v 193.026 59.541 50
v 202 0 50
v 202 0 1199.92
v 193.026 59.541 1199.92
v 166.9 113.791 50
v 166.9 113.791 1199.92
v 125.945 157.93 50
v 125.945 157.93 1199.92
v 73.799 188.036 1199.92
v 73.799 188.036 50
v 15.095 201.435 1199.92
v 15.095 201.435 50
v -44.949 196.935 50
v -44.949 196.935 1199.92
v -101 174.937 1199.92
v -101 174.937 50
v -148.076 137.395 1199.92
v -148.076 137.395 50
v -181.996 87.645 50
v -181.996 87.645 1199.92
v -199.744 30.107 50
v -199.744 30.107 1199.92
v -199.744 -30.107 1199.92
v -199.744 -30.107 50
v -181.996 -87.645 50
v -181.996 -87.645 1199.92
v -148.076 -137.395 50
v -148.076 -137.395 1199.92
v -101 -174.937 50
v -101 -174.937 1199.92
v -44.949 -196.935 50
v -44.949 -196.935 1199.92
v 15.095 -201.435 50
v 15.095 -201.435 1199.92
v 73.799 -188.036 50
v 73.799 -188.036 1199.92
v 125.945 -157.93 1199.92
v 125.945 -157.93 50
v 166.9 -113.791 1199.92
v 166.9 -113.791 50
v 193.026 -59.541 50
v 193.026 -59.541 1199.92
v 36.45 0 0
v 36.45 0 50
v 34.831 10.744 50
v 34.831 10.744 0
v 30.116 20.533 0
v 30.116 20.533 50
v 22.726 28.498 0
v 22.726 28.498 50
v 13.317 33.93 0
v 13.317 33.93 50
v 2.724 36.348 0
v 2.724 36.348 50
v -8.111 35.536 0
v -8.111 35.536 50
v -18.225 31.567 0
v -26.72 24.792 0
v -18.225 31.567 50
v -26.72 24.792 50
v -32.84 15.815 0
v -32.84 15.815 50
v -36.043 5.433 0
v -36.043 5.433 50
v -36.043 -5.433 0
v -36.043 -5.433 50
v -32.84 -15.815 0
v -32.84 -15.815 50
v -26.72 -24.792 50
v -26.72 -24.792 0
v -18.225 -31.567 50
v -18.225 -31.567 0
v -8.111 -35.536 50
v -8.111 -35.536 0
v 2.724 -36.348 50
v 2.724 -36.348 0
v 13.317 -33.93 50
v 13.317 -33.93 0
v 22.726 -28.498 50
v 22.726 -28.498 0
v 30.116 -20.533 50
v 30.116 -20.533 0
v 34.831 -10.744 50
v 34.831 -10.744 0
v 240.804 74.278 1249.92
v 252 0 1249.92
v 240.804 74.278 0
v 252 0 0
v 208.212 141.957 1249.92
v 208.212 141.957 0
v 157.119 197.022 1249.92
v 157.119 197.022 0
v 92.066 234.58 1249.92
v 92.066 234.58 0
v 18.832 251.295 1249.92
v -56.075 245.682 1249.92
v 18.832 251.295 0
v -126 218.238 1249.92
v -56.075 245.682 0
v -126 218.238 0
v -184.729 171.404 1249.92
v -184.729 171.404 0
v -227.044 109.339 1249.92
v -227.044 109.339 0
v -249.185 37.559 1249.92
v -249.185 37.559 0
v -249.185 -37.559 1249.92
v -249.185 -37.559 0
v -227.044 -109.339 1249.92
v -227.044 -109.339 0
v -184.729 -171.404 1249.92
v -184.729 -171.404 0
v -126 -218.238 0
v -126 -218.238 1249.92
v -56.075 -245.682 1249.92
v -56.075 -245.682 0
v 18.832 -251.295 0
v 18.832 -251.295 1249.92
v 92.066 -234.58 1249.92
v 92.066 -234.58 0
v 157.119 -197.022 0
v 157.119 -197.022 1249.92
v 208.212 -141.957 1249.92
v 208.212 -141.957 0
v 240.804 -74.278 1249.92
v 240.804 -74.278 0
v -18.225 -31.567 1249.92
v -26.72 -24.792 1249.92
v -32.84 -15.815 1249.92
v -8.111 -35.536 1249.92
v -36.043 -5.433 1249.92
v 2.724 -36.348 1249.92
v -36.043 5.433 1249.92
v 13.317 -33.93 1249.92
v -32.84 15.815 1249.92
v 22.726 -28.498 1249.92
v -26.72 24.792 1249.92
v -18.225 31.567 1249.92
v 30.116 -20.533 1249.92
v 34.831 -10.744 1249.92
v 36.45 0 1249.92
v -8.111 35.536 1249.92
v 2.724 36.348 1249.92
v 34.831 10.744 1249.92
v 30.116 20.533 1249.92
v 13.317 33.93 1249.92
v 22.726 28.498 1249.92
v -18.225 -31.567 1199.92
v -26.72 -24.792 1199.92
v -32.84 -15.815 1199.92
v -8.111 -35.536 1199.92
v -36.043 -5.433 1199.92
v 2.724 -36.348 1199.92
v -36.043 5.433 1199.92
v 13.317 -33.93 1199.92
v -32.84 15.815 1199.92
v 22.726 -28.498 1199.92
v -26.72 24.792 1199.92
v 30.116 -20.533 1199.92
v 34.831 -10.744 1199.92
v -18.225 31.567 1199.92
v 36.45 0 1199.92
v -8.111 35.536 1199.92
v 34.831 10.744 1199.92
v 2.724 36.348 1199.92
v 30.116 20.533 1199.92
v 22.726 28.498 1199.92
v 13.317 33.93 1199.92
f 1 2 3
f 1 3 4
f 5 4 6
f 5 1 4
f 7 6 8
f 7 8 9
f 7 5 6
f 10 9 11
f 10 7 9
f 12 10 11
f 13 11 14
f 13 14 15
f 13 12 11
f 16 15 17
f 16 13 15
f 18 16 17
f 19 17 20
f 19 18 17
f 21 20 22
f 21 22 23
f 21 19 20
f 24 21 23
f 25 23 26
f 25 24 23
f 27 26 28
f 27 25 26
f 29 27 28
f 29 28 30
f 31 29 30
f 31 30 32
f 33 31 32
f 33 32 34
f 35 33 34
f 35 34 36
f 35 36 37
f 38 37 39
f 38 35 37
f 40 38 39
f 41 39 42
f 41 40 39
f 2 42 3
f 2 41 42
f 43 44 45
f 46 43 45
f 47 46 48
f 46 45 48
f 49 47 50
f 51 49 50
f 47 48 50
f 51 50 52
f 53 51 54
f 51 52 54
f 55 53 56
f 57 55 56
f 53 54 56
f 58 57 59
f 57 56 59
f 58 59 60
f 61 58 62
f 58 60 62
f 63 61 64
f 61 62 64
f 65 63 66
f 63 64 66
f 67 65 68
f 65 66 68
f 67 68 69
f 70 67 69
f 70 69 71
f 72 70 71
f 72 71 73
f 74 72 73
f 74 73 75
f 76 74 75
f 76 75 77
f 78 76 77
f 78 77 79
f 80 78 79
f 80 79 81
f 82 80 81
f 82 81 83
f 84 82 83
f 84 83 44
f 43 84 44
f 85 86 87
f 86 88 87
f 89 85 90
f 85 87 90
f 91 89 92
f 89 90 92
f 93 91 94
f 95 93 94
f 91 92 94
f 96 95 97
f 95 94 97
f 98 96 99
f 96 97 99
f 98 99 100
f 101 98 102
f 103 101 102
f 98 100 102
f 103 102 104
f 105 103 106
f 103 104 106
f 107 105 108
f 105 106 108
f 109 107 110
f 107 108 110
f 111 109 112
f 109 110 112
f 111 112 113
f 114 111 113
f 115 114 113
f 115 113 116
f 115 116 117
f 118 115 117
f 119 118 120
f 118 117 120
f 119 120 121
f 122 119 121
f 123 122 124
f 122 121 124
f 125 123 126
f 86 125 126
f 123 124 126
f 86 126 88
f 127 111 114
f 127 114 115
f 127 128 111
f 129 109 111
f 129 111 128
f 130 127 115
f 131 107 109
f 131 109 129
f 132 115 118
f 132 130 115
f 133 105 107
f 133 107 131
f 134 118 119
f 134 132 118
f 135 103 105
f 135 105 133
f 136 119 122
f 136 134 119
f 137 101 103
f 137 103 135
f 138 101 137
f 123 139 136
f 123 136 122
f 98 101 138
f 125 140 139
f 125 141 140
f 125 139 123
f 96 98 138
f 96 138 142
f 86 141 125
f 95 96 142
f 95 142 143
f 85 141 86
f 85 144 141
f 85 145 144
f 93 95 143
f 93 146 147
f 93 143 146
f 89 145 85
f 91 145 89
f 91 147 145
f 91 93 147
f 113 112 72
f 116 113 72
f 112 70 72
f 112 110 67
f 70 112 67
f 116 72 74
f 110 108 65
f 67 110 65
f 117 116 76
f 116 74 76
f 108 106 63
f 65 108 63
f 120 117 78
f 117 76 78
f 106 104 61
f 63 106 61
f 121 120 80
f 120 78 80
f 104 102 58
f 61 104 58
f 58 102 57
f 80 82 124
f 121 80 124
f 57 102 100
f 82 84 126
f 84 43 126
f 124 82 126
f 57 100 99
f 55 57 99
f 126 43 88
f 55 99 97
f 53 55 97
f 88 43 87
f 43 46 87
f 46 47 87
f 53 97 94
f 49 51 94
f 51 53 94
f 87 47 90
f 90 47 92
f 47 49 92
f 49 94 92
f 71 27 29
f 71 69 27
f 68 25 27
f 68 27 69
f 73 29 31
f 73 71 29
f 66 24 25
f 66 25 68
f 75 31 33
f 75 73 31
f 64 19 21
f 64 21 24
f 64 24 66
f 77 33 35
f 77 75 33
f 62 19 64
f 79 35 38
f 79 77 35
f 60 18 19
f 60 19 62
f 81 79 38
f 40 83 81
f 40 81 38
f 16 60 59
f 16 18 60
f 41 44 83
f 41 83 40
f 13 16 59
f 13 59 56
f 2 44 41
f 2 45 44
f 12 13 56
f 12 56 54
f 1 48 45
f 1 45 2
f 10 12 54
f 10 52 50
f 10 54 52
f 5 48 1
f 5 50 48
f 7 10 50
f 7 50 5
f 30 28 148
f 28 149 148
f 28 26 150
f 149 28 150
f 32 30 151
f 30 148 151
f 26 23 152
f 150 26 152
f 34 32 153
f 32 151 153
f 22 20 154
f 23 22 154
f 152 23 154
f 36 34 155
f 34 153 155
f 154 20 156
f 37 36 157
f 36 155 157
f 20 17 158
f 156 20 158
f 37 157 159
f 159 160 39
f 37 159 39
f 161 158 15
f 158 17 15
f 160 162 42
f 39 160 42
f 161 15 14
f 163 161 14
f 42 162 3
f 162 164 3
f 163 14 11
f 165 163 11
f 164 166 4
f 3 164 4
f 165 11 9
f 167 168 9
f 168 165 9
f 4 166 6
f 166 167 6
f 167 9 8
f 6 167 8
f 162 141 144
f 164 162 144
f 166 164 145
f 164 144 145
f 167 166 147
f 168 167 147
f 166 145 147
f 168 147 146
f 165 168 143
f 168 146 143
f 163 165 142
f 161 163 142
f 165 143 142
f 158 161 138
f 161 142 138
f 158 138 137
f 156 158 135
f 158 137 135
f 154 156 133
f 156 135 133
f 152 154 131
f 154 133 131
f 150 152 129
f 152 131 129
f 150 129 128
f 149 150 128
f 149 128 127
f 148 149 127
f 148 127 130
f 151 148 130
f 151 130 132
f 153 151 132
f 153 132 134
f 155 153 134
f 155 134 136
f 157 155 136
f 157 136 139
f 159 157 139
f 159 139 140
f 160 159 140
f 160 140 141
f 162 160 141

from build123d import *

# Parameters (mm, degrees)
SKETCH1_R           = 252
BOSS_EXTRUDE1_DEPTH = 50
SKETCH2_R           = 252
SKETCH2_R_2         = 202
BOSS_EXTRUDE2_DEPTH = 1149.92
SKETCH3_R           = 252
BOSS_EXTRUDE3_DEPTH = 50
SKETCH4_R           = 36.45
CUT_EXTRUDE1_DEPTH  = 1300.733821365


with BuildPart() as part:
    # Sketch1 → Boss-Extrude1 (new body)
    with BuildSketch(Plane.XY):
        Circle(SKETCH1_R)
    extrude(amount=BOSS_EXTRUDE1_DEPTH)

    # Sketch2 → Boss-Extrude2 (add)
    with BuildSketch(Plane.XY.offset(50)):
        Circle(SKETCH2_R)
        Circle(SKETCH2_R_2, mode=Mode.SUBTRACT)
    extrude(amount=BOSS_EXTRUDE2_DEPTH)

    # Sketch3 → Boss-Extrude3 (add)
    with BuildSketch(Plane.XY.offset(1199.92)):
        Circle(SKETCH3_R)
    extrude(amount=BOSS_EXTRUDE3_DEPTH)

    # Sketch4 → Cut-Extrude1 (cut, through all)
    with BuildSketch(Plane.XY.offset(1249.92)):
        Circle(SKETCH4_R)
    extrude(amount=-CUT_EXTRUDE1_DEPTH, mode=Mode.SUBTRACT)


solid = part.part
